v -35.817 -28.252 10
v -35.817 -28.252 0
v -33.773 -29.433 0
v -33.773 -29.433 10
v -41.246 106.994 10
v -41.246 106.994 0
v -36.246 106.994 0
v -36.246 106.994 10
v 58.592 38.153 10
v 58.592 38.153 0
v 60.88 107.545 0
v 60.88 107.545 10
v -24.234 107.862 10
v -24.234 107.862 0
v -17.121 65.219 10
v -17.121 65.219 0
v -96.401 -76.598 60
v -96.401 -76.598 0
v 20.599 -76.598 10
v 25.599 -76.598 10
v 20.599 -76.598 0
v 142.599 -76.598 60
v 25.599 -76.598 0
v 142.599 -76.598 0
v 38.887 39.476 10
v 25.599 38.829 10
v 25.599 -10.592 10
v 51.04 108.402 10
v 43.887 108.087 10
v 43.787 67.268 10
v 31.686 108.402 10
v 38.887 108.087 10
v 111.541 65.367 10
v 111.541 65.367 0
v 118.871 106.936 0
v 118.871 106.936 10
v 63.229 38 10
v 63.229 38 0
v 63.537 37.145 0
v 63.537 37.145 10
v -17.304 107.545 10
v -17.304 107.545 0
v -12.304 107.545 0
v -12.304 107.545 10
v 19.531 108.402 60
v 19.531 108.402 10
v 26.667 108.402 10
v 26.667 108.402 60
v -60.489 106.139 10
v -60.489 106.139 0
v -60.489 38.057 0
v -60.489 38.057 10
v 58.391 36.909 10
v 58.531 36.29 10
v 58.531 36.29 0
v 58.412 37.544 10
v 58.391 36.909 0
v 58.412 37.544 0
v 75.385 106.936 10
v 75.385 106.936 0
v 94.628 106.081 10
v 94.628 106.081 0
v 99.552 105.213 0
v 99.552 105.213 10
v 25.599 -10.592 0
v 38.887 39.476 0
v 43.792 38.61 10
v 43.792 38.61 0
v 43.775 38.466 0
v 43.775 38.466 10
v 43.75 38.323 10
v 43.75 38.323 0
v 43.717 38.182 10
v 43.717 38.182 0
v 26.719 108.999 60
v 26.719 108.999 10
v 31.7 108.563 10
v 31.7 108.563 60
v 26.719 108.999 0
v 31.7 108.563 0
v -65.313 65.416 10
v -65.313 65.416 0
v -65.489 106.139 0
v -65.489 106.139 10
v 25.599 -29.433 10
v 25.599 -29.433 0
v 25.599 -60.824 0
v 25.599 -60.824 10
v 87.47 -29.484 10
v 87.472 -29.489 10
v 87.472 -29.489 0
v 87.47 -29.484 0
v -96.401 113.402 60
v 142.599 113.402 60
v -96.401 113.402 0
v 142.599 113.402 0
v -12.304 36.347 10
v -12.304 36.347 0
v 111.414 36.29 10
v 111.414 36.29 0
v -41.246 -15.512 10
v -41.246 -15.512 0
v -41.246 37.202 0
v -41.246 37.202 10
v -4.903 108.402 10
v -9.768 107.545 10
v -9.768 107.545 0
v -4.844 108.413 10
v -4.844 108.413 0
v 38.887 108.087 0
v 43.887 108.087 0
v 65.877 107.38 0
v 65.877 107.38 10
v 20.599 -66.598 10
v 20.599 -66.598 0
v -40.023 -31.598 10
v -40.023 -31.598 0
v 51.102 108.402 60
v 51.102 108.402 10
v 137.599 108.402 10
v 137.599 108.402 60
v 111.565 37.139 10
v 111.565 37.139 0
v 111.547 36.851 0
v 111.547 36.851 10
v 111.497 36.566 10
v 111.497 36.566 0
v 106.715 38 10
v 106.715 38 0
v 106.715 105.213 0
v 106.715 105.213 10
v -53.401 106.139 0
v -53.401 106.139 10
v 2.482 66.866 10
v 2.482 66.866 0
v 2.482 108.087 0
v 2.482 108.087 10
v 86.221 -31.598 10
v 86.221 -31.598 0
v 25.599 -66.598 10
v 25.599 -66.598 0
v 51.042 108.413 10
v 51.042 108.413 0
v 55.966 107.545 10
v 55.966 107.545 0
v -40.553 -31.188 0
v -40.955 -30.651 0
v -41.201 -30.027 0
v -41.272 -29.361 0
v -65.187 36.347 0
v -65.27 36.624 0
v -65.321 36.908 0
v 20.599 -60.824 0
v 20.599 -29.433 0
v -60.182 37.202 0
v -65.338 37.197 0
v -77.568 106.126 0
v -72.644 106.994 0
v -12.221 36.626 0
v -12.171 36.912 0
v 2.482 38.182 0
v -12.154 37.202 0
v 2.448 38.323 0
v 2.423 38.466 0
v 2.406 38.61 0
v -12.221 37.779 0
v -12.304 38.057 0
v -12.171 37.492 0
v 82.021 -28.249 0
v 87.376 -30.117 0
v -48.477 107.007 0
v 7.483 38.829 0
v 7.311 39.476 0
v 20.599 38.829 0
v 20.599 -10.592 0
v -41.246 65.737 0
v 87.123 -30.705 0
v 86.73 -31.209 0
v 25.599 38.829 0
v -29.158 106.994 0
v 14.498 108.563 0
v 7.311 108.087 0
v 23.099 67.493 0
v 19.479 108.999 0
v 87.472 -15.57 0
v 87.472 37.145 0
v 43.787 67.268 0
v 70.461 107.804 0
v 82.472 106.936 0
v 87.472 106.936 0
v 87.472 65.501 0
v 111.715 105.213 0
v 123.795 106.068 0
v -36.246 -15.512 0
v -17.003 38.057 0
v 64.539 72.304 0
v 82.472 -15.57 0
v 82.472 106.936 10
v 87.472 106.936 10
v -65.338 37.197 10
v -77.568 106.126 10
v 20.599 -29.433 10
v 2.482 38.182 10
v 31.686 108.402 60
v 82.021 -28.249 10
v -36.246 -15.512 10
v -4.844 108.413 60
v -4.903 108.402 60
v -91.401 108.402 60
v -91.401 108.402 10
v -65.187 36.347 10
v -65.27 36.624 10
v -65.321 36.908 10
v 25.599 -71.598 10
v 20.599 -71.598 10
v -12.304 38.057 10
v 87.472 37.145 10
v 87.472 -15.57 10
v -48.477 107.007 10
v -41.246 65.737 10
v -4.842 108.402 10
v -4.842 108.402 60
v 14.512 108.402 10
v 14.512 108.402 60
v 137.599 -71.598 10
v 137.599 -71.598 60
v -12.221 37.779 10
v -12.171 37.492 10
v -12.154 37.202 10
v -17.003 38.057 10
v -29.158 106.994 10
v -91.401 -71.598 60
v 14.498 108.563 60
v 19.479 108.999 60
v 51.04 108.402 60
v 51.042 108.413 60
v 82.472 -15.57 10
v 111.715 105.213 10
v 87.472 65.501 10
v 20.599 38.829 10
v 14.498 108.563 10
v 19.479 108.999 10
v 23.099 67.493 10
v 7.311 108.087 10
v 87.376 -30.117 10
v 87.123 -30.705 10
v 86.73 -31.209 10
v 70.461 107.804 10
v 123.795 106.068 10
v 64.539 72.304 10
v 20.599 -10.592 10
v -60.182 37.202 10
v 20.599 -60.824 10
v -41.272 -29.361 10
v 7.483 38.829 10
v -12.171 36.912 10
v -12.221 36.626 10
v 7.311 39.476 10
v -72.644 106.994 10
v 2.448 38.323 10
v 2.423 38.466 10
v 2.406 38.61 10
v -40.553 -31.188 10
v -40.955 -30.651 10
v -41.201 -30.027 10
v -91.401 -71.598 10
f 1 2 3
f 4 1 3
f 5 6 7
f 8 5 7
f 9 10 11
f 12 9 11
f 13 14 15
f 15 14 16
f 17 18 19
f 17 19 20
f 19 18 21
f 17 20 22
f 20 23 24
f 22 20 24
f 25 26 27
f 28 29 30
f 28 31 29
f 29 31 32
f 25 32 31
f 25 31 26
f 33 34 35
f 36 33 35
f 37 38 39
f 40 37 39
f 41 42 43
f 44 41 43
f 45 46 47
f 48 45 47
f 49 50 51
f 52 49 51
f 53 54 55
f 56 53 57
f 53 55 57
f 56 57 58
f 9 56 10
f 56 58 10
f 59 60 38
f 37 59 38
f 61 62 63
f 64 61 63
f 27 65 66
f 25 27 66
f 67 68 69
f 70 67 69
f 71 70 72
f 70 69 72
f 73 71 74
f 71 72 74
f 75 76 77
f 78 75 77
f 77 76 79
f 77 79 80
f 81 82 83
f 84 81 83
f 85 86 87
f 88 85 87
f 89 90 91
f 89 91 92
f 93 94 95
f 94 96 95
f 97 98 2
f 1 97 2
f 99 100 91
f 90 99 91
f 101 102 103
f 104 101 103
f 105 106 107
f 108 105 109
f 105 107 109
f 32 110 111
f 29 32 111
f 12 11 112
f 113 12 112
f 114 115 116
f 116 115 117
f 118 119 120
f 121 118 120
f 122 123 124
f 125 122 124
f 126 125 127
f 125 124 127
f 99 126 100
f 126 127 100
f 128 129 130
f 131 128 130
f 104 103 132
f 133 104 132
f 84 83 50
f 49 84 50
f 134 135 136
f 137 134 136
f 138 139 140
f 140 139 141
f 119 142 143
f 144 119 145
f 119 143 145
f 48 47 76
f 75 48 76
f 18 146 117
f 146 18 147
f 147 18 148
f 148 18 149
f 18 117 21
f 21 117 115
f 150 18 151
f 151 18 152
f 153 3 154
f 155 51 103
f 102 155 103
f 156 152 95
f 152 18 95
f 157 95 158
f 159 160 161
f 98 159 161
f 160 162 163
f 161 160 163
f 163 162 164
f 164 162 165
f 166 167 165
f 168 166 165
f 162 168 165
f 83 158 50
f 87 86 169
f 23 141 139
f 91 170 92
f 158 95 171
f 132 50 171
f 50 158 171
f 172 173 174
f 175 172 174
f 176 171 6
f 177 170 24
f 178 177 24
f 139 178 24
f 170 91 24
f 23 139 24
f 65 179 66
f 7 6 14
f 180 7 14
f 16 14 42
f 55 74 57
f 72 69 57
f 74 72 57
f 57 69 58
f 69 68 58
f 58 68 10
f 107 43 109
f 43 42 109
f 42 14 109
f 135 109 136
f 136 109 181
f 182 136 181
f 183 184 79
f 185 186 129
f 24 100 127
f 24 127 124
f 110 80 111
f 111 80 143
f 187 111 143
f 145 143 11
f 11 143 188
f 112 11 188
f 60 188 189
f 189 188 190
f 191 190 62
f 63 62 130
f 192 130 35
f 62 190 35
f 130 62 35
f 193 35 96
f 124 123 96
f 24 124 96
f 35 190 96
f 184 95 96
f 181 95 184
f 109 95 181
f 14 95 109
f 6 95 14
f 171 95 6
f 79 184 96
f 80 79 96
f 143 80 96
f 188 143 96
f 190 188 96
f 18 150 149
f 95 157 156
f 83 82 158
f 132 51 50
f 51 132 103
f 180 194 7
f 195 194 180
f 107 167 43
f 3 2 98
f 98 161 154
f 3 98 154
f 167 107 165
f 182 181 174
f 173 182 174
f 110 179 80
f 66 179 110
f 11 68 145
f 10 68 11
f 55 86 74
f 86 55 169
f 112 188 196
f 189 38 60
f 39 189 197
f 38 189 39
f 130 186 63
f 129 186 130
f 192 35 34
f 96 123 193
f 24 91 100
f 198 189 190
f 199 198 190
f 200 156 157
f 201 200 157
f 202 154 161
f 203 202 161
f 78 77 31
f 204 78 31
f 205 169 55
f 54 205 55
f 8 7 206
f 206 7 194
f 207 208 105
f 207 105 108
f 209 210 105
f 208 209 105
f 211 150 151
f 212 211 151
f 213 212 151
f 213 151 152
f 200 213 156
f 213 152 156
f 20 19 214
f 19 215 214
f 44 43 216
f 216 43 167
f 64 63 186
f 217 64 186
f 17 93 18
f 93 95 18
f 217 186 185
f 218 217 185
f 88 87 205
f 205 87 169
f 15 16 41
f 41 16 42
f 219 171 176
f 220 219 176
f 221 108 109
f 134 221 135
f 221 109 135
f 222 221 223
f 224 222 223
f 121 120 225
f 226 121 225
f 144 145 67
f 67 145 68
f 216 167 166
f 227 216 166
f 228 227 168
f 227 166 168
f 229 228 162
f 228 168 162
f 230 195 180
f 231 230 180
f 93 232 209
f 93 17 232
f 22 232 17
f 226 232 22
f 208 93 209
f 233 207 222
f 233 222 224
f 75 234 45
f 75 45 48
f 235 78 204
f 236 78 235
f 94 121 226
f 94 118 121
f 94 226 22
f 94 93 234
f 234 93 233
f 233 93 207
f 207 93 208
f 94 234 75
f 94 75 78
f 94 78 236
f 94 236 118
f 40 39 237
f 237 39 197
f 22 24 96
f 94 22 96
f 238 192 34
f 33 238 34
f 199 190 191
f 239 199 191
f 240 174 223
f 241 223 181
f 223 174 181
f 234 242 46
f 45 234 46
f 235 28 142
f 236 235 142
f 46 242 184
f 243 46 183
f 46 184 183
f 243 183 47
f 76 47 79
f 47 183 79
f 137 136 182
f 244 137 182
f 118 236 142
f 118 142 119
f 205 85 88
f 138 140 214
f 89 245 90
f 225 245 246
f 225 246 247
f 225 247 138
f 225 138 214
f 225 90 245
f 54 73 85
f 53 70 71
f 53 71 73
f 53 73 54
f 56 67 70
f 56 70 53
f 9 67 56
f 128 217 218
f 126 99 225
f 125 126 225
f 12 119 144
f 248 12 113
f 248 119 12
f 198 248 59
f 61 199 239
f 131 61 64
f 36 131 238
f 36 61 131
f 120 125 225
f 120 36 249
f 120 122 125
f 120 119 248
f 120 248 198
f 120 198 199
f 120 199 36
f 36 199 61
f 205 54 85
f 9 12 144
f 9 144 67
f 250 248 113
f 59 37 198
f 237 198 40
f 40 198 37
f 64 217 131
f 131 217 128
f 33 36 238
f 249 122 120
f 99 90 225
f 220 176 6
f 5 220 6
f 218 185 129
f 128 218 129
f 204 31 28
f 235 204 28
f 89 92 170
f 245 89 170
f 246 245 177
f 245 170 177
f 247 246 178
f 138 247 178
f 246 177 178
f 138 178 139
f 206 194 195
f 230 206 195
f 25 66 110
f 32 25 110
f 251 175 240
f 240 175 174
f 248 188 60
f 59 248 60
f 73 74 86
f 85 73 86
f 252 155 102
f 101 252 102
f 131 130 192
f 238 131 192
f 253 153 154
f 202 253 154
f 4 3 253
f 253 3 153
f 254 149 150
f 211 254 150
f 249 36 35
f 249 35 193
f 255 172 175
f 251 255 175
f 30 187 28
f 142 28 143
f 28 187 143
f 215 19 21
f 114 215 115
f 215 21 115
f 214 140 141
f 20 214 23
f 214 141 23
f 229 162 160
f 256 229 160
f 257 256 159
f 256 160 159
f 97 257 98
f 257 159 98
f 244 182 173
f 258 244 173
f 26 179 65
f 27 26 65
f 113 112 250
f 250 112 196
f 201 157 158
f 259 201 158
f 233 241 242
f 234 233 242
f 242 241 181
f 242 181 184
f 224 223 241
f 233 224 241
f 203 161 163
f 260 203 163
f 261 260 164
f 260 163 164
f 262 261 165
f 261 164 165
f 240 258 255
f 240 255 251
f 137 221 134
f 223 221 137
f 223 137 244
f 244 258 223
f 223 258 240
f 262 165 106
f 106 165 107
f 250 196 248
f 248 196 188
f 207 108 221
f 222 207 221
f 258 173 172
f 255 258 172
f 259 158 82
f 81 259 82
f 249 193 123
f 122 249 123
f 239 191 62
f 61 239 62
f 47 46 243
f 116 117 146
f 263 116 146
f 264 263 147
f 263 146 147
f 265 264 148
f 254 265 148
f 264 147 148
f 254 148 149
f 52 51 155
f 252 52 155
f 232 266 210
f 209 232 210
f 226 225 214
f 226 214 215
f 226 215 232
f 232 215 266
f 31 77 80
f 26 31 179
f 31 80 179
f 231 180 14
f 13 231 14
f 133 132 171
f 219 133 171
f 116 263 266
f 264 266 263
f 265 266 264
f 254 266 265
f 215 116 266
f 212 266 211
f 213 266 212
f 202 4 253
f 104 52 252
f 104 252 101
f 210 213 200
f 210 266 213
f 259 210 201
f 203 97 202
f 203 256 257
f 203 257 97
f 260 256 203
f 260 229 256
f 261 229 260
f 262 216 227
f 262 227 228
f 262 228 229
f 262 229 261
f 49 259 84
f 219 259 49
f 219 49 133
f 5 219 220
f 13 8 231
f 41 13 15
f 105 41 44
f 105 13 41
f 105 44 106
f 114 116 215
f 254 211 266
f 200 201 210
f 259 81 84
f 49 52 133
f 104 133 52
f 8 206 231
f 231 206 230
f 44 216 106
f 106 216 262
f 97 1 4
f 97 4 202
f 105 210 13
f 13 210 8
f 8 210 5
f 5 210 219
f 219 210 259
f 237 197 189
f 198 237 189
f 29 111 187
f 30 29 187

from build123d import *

# Parameters (mm, degrees)
F1_DEPTH = 10
F2_W     = 5
F2_H     = 5
F2_W_2   = 112
F2_H_2   = 175.8788333833
F3_DEPTH = 50


with BuildPart() as f1:
    # F0 (on Top) → F1 (new body)
    with BuildSketch(Plane.XY):
        with BuildLine():
            Line((86.2209709888, -31.5977521241), (25.5991927239, -66.5977521241))
            Line((25.5991927239, -66.5977521241), (25.5991927239, -76.5977521241))
            Line((25.5991927239, -76.5977521241), (142.5991927239, -76.5977521241))
            Line((142.5991927239, -76.5977521241), (142.5991927239, 113.4022478759))
            Line((142.5991927239, 113.4022478759), (-96.4008072761, 113.4022478759))
            Line((-96.4008072761, 113.4022478759), (-96.4008072761, -76.5977521241))
            Line((-96.4008072761, -76.5977521241), (20.5991927239, -76.5977521241))
            Line((20.5991927239, -76.5977521241), (20.5991927239, -66.5977521241))
            Line((20.5991927239, -66.5977521241), (-40.022585541, -31.5977521241))
            ThreePointArc((-40.022585541, -31.5977521241), (-40.9554062839, -30.6514148366), (-41.2715508997, -29.3607710507))
            Line((-41.2715508997, -29.3607710507), (-65.1872733153, 36.3471362561))
            ThreePointArc((-65.1872733153, 36.3471362561), (-65.299594413, 36.765427467), (-65.3380360189, 37.1968272921))
            Line((-65.3380360189, 37.1968272921), (-77.5682214131, 106.1255387952))
            Line((-77.5682214131, 106.1255387952), (-72.6441826481, 106.9937796835))
            Line((-72.6441826481, 106.9937796835), (-65.3128655033, 65.4158140463))
            Line((-65.3128655033, 65.4158140463), (-65.4888102114, 106.1387293252))
            Line((-65.4888102114, 106.1387293252), (-60.4888102114, 106.1387293252))
            Line((-60.4888102114, 106.1387293252), (-60.4888102114, 38.0572369727))
            Line((-60.4888102114, 38.0572369727), (-60.1816628514, 37.2021866144))
            Line((-60.1816628514, 37.2021866144), (-41.2458632825, 37.2021866144))
            Line((-41.2458632825, 37.2021866144), (-53.4012357192, 106.1387293252))
            Line((-53.4012357192, 106.1387293252), (-48.4771969541, 107.0069702136))
            Line((-48.4771969541, 107.0069702136), (-41.2458632825, 65.7374164892))
            Line((-41.2458632825, 65.7374164892), (-41.2458632825, 106.9938002617))
            Line((-41.2458632825, 106.9938002617), (-36.2458632825, 106.9938002617))
            Line((-36.2458632825, 106.9938002617), (-36.2458632825, 37.2021866144))
            Line((-36.2458632825, 37.2021866144), (-36.2458632825, -15.5121263044))
            Line((-36.2458632825, -15.5121263044), (-17.0029098654, 38.0572575508))
            Line((-17.0029098654, 38.0572575508), (-29.1582823021, 106.9938002617))
            Line((-29.1582823021, 106.9938002617), (-24.234243537, 107.86204115))
            Line((-24.234243537, 107.86204115), (-17.1207785738, 65.2193512955))
            Line((-17.1207785738, 65.2193512955), (-17.3044467615, 107.5445162737))
            Line((-17.3044467615, 107.5445162737), (-12.3044467615, 107.5445162737))
            Line((-12.3044467615, 107.5445162737), (-12.3044467615, 38.0572575508))
            ThreePointArc((-12.3044467615, 38.0572575508), (-12.1916589309, 37.6363276367), (-12.1536783134, 37.2022071925))
            ThreePointArc((-12.1536783134, 37.2022071925), (-12.1916589309, 36.7680867483), (-12.3044467615, 36.3471568342))
            Line((-12.3044467615, 36.3471568342), (-35.8167873917, -28.2524681259))
            Line((-35.8167873917, -28.2524681259), (-33.772585541, -29.4326886146))
            Line((-33.772585541, -29.4326886146), (20.5991927239, -29.4326886146))
            Line((20.5991927239, -29.4326886146), (2.4818595667, 38.1821192256))
            ThreePointArc((2.4818595667, 38.1821192256), (2.4347721068, 38.3943813555), (2.4063054657, 38.6099320248))
            Line((2.4063054657, 38.6099320248), (-9.7679225036, 107.5445162737))
            Line((-9.7679225036, 107.5445162737), (-4.8438837385, 108.412757162))
            Line((-4.8438837385, 108.412757162), (2.4818595667, 66.8664023398))
            Line((2.4818595667, 66.8664023398), (2.4818595667, 108.0871745944))
            Line((2.4818595667, 108.0871745944), (7.3114886982, 108.0871745944))
            Line((7.3114886982, 108.0871745944), (7.3114886982, 39.4762144511))
            Line((7.3114886982, 39.4762144511), (7.4832083847, 38.8291668384))
            Line((7.4832083847, 38.8291668384), (20.5991927239, 38.8291668384))
            Line((20.5991927239, 38.8291668384), (14.4982907316, 108.5627957048))
            Line((14.4982907316, 108.5627957048), (19.479264222, 108.9985744185))
            Line((19.479264222, 108.9985744185), (23.0991927239, 67.4934753996))
            Line((23.0991927239, 67.4934753996), (26.7191212258, 108.9985744185))
            Line((26.7191212258, 108.9985744185), (31.7000947162, 108.5627957048))
            Line((31.7000947162, 108.5627957048), (25.5991927239, 38.8291668384))
            Line((25.5991927239, 38.8291668384), (25.5991927239, -10.5924605114))
            Line((25.5991927239, -10.5924605114), (38.8868967496, 39.4762144511))
            Line((38.8868967496, 39.4762144511), (38.8868967496, 108.0871745944))
            Line((38.8868967496, 108.0871745944), (43.8868967496, 108.0871745944))
            Line((43.8868967496, 108.0871745944), (43.7874143185, 67.2684306459))
            Line((43.7874143185, 67.2684306459), (51.0422691863, 108.412757162))
            Line((51.0422691863, 108.412757162), (55.9663079514, 107.5445162737))
            Line((55.9663079514, 107.5445162737), (43.7920799821, 38.6099320248))
            ThreePointArc((43.7920799821, 38.6099320248), (43.763613341, 38.3943813555), (43.7165258811, 38.1821192256))
            Line((43.7165258811, 38.1821192256), (25.5991927239, -29.4326886146))
            Line((25.5991927239, -29.4326886146), (25.5991927239, -60.8242494322))
            Line((25.5991927239, -60.8242494322), (82.0211007138, -28.249045666))
            Line((82.0211007138, -28.249045666), (58.5309586011, 36.2895893685))
            ThreePointArc((58.5309586011, 36.2895893685), (58.3815477723, 37.2270184447), (58.5923799556, 38.1525705281))
            Line((58.5923799556, 38.1525705281), (60.8801901531, 107.5445162737))
            Line((60.8801901531, 107.5445162737), (65.8774749146, 107.379758838))
            Line((65.8774749146, 107.379758838), (64.5387270896, 72.304022517))
            Line((64.5387270896, 72.304022517), (70.4607553767, 107.8044736843))
            Line((70.4607553767, 107.8044736843), (75.3847941417, 106.936232796))
            Line((75.3847941417, 106.936232796), (63.229421705, 37.9996900851))
            Line((63.229421705, 37.9996900851), (63.536569065, 37.1446397268))
            Line((63.536569065, 37.1446397268), (82.4723686339, 37.1446397268))
            Line((82.4723686339, 37.1446397268), (82.4723686339, 106.936232796))
            Line((82.4723686339, 106.936232796), (87.4723686339, 106.936232796))
            Line((87.4723686339, 106.936232796), (87.4723686339, 65.5010488249))
            Line((87.4723686339, 65.5010488249), (94.6277410706, 106.0811824377))
            Line((94.6277410706, 106.0811824377), (99.5517798357, 105.2129415493))
            Line((99.5517798357, 105.2129415493), (87.4723686339, 37.1446397268))
            Line((87.4723686339, 37.1446397268), (87.4723686339, -15.5696737109))
            Line((87.4723686339, -15.5696737109), (106.7153155628, 37.9996900851))
            Line((106.7153155628, 37.9996900851), (106.7153155628, 105.2129415493))
            Line((106.7153155628, 105.2129415493), (111.7153155628, 105.2129415493))
            Line((111.7153155628, 105.2129415493), (111.5409932174, 65.3674680349))
            Line((111.5409932174, 65.3674680349), (118.8706879995, 106.936232796))
            Line((118.8706879995, 106.936232796), (123.7947267645, 106.0679919077))
            Line((123.7947267645, 106.0679919077), (111.5645413703, 37.1392804046))
            ThreePointArc((111.5645413703, 37.1392804046), (111.5260997644, 36.7078805795), (111.4137786667, 36.2895893685))
            Line((111.4137786667, 36.2895893685), (87.4723686339, -29.4888940865))
            Line((87.4723686339, -29.4888940865), (87.4704533123, -29.4835621298))
            ThreePointArc((87.4704533123, -29.4835621298), (87.1232033779, -30.7046539221), (86.2209709888, -31.5977521241))
        make_face()
        Polygon((-33.772585541, -29.4326886146), (20.5991927239, -60.8242494322), (20.5991927239, -29.4326886146), align=None)
        Polygon((-60.1816628514, 37.2021866144), (-41.2458632825, -15.5121268233), (-41.2458632825, 37.2021866144), align=None)
        Polygon((7.4832083847, 38.8291668384), (20.5991927239, -10.5924605114), (20.5991927239, 38.8291668384), align=None)
        Polygon((63.536569065, 37.1446397268), (82.4723686339, -15.5696737109), (82.4723686339, 37.1446397268), align=None)
    extrude(amount=F1_DEPTH)

    # F2 (on face) → F3 (join)
    with BuildSketch(Plane.XY.offset(10)):
        with Locations((23.0991927239, -74.0977521241)):
            Rectangle(F2_W, F2_H)
        Polygon((25.5991927239, -71.5977521241), (25.5991927239, -76.5977521241), (142.5991927239, -76.5977521241), (142.5991927239, -67.4765855074), (137.5991927239, -67.4765855074), (137.5991927239, -71.5977521241), align=None)
        with Locations((-35.4008072761, -74.0977521241)):
            Rectangle(F2_W_2, F2_H)
        Polygon((-96.4008072761, 113.4022478759), (-96.4008072761, -76.5977521241), (-91.4008072761, -76.5977521241), (-91.4008072761, -71.5977521241), (-91.4008072761, 108.4022478759), (-91.4008072761, 113.4022478759), align=None)
        with Locations((140.0991927239, 20.4628311843)):
            Rectangle(F2_W, F2_H_2)
        Polygon((142.5991927239, 113.4022478759), (-91.4008072761, 113.4022478759), (-91.4008072761, 108.4022478759), (-4.9034848615, 108.4022478759), (-4.8438837385, 108.412757162), (-4.8420306678, 108.4022478759), (14.5123368465, 108.4022478759), (14.4982907316, 108.5627957048), (19.479264222, 108.9985744185), (19.531273722, 108.4022478759), (26.6671117258, 108.4022478759), (26.7191212258, 108.9985744185), (31.7000947162, 108.5627957048), (31.6860486013, 108.4022478759), (51.0404161156, 108.4022478759), (51.0422691863, 108.412757162), (51.1018703093, 108.4022478759), (137.5991927239, 108.4022478759), (142.5991927239, 108.4022478759), align=None)
    extrude(amount=F3_DEPTH)


solid = f1.part
